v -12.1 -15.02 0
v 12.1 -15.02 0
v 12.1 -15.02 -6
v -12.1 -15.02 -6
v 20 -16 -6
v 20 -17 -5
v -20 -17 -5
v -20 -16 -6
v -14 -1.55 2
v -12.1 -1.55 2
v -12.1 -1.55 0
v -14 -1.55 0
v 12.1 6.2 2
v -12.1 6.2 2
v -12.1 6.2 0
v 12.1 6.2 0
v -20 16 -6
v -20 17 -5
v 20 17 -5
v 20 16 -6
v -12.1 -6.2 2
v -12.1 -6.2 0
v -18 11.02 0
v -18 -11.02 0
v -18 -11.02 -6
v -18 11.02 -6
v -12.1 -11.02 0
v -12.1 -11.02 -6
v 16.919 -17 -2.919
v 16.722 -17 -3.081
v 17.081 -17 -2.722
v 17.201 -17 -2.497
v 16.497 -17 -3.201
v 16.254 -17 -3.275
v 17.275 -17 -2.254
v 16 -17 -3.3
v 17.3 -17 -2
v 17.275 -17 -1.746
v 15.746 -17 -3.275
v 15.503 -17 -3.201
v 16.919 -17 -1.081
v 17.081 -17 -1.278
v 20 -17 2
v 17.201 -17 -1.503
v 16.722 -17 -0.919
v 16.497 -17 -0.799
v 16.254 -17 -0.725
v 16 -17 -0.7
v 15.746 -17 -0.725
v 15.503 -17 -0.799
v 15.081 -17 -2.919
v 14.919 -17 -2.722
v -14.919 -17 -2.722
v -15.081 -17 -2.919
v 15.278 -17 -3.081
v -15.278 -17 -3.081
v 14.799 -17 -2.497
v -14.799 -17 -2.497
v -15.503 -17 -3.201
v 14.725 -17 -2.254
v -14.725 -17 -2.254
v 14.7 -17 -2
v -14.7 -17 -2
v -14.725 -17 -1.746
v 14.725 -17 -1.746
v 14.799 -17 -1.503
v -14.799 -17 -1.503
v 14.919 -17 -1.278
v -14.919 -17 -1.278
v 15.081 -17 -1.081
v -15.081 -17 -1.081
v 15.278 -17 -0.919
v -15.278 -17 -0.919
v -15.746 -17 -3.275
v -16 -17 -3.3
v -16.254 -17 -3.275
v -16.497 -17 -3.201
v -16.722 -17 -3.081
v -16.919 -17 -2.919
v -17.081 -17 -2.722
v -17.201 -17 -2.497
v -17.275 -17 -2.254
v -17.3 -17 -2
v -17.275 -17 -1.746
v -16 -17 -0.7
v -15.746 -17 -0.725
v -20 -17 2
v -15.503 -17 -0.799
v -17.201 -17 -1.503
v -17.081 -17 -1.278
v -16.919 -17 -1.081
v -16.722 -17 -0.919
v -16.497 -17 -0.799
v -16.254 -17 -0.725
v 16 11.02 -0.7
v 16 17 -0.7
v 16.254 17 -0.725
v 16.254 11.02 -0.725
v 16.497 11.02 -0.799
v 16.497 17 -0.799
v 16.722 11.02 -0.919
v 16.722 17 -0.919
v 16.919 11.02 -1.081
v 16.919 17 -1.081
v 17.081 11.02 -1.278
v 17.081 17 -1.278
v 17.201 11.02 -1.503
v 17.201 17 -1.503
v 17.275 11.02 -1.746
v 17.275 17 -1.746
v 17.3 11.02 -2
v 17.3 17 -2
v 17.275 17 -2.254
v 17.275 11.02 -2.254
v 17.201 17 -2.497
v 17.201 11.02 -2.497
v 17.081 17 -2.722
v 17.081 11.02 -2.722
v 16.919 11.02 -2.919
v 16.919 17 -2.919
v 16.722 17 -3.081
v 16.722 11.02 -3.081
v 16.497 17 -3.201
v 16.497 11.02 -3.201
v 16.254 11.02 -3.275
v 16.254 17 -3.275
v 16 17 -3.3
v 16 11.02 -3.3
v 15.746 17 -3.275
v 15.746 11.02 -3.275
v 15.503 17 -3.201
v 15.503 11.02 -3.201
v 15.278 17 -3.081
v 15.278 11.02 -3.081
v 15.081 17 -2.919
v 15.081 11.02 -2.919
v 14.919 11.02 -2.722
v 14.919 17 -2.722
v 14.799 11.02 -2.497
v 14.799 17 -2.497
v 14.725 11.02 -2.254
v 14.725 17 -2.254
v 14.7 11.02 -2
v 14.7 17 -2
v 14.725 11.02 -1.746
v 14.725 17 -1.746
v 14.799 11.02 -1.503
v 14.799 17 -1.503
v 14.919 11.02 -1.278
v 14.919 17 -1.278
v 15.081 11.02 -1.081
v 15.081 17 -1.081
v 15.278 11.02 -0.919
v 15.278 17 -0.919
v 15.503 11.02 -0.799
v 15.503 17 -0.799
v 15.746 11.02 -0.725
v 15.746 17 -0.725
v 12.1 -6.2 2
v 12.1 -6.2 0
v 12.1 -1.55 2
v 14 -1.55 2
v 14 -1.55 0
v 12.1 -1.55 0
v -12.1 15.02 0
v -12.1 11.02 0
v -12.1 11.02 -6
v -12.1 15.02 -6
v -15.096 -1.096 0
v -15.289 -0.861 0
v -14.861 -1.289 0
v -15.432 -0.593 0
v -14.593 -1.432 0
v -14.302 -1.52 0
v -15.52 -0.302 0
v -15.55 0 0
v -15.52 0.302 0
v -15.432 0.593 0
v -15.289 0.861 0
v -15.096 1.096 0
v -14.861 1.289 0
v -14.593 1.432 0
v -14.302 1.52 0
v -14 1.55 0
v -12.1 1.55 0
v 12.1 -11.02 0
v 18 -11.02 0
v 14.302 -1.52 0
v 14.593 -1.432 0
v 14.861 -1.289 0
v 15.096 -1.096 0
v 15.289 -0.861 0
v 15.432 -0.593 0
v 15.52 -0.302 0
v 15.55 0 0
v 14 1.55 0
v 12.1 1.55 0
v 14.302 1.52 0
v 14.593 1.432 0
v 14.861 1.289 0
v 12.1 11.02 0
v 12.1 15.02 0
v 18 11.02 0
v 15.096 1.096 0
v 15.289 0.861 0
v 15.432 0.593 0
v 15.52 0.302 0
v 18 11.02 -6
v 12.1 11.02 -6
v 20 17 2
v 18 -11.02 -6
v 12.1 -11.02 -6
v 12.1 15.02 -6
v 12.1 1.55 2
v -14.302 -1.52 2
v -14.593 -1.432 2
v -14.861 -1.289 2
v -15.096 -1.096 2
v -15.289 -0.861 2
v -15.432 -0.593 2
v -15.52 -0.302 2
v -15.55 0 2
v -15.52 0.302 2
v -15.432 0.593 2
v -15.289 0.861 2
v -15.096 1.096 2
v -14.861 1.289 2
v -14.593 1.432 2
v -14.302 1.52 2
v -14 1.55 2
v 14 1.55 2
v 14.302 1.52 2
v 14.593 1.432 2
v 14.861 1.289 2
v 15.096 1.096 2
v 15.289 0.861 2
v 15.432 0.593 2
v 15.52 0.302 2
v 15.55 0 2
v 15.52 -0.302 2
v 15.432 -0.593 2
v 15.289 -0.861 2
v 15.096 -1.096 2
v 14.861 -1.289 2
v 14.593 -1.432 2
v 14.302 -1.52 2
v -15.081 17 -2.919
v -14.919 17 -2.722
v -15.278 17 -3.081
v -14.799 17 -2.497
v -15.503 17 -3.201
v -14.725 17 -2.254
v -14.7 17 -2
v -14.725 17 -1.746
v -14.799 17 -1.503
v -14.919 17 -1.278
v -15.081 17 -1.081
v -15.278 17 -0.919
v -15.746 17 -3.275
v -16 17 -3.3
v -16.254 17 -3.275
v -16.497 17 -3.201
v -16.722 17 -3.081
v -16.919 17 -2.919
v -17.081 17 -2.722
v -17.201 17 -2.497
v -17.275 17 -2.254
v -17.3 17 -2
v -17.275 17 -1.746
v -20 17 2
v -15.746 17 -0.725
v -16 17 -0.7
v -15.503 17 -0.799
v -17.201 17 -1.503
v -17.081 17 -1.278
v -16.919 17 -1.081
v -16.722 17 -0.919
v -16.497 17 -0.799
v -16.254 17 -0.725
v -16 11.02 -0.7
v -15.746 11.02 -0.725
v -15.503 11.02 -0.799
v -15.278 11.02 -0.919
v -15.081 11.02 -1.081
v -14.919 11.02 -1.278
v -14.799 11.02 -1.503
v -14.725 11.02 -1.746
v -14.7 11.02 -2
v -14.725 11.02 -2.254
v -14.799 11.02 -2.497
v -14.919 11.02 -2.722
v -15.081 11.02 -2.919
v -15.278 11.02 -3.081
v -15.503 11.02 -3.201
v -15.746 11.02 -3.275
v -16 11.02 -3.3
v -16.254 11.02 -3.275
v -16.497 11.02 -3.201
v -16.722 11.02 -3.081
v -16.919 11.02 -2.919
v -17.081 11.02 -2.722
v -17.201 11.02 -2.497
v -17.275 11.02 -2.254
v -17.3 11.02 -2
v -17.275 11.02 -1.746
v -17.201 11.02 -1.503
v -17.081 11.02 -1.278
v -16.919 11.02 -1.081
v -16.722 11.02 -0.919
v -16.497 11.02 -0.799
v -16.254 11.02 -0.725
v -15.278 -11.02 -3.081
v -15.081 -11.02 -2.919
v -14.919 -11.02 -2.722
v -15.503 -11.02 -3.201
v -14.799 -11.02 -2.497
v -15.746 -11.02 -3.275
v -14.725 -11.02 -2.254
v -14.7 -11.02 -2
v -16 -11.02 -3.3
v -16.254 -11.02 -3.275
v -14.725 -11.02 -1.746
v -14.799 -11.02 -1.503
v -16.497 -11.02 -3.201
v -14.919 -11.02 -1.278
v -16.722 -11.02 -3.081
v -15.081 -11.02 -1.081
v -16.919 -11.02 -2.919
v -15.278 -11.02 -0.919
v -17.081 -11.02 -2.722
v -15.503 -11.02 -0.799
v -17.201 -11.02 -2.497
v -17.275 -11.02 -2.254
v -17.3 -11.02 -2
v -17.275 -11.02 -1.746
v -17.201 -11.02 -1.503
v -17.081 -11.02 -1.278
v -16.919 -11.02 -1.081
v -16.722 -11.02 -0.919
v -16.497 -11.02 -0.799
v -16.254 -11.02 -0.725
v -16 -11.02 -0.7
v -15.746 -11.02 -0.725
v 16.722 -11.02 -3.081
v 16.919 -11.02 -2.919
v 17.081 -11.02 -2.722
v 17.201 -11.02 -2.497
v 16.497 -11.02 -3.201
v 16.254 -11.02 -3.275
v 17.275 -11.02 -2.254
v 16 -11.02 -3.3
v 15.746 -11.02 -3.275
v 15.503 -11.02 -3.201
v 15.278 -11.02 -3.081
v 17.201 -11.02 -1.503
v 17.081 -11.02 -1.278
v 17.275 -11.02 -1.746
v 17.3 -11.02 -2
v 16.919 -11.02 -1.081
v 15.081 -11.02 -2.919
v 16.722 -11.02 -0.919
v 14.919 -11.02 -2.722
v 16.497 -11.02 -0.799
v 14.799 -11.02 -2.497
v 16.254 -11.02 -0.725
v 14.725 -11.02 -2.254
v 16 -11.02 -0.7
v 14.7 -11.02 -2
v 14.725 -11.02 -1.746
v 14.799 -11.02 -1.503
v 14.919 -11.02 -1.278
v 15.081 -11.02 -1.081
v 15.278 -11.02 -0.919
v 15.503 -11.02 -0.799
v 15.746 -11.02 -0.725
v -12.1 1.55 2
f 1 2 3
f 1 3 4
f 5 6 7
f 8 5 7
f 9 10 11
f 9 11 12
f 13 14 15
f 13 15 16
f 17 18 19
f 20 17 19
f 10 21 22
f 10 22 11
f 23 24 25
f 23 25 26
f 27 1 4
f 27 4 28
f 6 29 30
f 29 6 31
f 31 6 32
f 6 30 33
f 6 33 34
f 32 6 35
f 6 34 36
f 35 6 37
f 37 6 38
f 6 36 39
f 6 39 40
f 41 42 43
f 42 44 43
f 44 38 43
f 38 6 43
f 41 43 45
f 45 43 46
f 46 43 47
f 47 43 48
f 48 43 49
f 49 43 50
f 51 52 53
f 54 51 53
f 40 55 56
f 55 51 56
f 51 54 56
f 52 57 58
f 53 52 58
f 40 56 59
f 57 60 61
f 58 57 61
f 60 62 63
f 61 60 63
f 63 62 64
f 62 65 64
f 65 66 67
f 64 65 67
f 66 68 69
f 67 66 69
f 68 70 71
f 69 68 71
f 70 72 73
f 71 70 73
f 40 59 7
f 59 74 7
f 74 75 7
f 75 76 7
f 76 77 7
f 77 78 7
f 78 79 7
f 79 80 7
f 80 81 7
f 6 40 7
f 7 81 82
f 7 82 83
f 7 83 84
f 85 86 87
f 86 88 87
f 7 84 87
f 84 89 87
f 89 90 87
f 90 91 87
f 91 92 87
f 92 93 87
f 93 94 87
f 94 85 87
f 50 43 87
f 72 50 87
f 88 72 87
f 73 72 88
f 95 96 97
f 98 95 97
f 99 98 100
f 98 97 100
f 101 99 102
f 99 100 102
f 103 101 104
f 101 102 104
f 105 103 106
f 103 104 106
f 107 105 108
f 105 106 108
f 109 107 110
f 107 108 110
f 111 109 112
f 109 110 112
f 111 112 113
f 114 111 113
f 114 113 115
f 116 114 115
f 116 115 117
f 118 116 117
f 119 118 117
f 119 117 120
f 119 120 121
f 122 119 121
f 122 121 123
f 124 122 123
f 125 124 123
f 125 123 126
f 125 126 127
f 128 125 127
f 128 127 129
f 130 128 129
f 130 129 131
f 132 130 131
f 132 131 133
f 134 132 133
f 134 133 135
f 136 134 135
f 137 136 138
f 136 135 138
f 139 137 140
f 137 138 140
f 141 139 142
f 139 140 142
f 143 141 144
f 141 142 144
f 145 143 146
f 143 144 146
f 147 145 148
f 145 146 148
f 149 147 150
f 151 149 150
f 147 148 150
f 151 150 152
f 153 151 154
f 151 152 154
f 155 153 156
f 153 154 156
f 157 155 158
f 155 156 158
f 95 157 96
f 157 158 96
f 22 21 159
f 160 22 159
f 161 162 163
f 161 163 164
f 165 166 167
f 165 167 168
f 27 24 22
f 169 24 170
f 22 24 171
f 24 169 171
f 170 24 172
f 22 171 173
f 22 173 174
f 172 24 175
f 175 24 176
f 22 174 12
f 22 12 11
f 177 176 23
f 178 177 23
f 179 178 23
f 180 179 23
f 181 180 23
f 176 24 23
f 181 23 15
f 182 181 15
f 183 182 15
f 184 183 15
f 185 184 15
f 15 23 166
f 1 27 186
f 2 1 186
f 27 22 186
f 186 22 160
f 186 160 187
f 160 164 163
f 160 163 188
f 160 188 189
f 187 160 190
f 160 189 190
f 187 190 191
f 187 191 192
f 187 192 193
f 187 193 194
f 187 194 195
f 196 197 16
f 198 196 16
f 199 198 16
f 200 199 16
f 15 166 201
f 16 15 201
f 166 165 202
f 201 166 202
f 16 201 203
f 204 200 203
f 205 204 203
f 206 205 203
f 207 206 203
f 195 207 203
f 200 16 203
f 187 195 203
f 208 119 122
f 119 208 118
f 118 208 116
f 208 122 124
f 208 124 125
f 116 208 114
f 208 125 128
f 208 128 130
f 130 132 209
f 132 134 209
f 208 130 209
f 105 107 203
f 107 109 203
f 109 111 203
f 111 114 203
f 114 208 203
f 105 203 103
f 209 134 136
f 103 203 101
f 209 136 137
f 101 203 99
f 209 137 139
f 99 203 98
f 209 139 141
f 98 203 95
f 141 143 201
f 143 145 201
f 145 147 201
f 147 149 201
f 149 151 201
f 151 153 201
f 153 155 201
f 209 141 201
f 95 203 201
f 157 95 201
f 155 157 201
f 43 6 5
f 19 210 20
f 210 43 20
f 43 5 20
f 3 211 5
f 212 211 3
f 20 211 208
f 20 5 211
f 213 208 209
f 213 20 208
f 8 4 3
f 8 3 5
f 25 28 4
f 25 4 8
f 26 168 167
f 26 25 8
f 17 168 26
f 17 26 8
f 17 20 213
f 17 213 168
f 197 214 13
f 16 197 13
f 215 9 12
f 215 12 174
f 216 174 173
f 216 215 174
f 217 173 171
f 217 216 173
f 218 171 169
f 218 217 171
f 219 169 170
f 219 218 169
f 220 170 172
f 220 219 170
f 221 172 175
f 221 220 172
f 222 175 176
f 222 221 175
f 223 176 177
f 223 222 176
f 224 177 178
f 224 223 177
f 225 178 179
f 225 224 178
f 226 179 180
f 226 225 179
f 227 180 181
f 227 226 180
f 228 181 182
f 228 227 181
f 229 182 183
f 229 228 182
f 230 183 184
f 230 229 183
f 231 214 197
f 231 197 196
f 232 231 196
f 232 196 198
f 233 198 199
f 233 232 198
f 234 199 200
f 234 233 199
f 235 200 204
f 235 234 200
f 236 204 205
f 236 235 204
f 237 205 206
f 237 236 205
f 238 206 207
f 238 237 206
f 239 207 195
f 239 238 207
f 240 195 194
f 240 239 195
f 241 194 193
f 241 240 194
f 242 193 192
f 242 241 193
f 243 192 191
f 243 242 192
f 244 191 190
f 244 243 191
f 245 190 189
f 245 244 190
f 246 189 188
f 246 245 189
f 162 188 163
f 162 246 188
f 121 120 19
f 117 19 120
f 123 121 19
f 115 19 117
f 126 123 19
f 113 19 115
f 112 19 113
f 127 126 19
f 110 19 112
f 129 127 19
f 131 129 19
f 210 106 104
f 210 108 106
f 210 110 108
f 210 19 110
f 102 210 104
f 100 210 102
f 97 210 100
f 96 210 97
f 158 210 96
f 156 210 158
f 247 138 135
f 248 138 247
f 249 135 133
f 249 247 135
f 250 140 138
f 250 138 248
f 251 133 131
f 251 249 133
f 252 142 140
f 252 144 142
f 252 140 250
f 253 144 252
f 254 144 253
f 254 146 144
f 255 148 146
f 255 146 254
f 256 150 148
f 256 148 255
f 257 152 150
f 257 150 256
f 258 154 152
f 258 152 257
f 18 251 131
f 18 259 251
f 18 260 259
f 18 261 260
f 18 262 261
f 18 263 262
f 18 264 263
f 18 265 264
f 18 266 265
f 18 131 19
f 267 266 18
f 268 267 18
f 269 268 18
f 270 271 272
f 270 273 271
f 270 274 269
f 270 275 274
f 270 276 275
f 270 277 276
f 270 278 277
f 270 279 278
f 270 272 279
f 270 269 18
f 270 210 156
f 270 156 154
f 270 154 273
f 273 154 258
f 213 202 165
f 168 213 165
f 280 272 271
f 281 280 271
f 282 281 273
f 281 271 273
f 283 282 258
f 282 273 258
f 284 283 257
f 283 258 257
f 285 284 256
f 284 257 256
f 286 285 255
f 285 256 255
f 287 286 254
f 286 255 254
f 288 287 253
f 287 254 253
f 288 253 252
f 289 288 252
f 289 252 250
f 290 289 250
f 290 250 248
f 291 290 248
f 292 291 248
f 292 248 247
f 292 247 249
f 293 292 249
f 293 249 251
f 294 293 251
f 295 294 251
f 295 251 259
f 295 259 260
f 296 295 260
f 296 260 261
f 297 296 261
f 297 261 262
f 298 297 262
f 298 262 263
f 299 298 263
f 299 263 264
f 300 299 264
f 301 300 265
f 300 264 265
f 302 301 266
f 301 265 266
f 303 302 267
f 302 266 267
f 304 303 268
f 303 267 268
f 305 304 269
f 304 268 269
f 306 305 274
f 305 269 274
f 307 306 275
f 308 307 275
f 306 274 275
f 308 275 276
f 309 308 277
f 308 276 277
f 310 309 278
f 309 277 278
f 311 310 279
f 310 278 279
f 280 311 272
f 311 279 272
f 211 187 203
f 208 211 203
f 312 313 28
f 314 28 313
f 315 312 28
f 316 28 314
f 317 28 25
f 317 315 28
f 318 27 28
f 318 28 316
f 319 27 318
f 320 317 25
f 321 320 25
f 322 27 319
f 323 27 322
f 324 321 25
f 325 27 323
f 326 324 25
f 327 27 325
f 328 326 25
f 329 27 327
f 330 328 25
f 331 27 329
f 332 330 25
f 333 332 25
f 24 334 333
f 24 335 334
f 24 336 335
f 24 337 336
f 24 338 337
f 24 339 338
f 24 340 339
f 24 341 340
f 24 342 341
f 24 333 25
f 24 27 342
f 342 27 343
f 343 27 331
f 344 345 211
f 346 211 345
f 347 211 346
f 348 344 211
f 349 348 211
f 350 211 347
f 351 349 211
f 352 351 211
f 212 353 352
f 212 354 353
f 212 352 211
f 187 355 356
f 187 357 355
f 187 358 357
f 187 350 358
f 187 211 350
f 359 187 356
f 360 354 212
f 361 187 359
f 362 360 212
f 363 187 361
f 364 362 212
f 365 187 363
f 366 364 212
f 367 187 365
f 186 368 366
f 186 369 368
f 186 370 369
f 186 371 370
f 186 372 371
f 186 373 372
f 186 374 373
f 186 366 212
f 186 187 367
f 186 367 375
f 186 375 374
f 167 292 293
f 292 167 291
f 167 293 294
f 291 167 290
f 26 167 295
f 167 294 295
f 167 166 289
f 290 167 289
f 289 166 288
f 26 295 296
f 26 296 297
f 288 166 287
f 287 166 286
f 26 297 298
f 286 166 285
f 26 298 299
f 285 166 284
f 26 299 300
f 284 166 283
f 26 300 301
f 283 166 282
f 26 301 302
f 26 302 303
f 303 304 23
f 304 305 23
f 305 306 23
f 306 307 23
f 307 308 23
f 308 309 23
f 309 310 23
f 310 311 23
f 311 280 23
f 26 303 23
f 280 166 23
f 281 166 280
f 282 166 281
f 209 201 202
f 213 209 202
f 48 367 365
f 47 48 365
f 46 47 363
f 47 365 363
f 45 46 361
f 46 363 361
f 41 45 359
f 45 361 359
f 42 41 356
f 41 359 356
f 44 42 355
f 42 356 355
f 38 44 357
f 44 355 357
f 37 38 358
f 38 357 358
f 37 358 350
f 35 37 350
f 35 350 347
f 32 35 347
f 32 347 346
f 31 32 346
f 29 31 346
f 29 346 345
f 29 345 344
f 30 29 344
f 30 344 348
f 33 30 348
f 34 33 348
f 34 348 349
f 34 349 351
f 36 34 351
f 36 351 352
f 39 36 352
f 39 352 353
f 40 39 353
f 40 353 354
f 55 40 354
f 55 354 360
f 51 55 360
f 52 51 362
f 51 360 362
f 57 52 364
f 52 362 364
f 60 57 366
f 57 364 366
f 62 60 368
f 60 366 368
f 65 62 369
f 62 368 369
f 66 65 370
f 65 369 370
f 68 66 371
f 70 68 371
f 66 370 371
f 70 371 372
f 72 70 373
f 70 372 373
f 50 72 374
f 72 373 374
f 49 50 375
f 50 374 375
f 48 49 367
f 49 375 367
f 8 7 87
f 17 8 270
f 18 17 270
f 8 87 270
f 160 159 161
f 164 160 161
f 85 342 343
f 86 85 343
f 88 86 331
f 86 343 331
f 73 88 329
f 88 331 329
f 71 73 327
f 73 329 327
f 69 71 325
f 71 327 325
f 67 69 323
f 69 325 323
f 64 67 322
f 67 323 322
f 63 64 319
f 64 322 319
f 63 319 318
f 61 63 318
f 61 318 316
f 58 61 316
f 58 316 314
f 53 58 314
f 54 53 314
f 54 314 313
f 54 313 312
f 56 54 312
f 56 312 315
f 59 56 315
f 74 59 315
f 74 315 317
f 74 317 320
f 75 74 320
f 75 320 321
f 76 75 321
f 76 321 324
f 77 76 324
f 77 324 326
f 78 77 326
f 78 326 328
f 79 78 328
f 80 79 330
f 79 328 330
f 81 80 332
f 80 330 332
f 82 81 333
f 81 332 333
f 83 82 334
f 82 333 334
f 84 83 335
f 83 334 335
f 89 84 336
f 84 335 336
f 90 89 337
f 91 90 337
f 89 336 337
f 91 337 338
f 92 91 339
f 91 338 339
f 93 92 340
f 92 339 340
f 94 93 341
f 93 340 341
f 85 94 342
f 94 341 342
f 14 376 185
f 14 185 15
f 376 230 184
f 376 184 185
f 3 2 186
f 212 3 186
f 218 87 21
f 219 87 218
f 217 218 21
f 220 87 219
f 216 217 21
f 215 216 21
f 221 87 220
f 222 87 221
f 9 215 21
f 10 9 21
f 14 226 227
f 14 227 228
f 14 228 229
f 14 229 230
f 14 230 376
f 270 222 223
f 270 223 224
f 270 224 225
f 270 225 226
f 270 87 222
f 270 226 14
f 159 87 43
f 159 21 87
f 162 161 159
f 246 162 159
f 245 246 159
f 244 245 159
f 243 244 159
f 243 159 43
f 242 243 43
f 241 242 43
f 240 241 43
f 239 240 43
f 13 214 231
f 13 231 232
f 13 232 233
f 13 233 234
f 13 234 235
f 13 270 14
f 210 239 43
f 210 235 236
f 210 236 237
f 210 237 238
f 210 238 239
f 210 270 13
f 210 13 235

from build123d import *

# Parameters (mm, degrees)
SKETCH_1_W          = 40
SKETCH_1_H          = 34
EXTRUDE_1_DEPTH     = 2
SKETCH_2_W          = 24.2
SKETCH_2_H          = 12.4
CUT_EXTRUDE_1_DEPTH = 2
SKETCH_3_W          = 2
SKETCH_3_H          = 34
EXTRUDE_2_DEPTH     = 6
SKETCH_5_W          = 36
SKETCH_5_H          = 1.98
EXTRUDE_3_DEPTH     = 6
SKETCH_6_W          = 5.9
SKETCH_6_H          = 4
EXTRUDE_4_DEPTH     = 6
SKETCH_7_R          = 1.3
CUT_EXTRUDE_2_DEPTH = 40.899874687
CHAMFER_1_SIZE      = 1


with BuildPart() as part:
    # ｽｹｯﾁ1 → ﾎﾞｽ - 押し出し1 (new body)
    with BuildSketch(Plane.XY):
        Rectangle(SKETCH_1_W, SKETCH_1_H)
    extrude(amount=EXTRUDE_1_DEPTH)

    # ｽｹｯﾁ2 → ｶｯﾄ - 押し出し1 (cut)
    with BuildSketch(Plane.XY.offset(2)):
        Rectangle(SKETCH_2_W, SKETCH_2_H)
        with BuildLine():
            Line((-14, 1.55), (14, 1.55))
            ThreePointArc((14, 1.55), (15.55, 0), (14, -1.55))
            Line((14, -1.55), (-14, -1.55))
            ThreePointArc((-14, -1.55), (-15.55, 0), (-14, 1.55))
        make_face()
    extrude(amount=-CUT_EXTRUDE_1_DEPTH, mode=Mode.SUBTRACT)

    # ｽｹｯﾁ3 → ﾎﾞｽ - 押し出し2 (add)
    with BuildSketch(Plane(origin=(0, 0, 0), x_dir=(-1, 0, 0), z_dir=(0, 0, -1))):
        with Locations((19, 0)):
            Rectangle(SKETCH_3_W, SKETCH_3_H)
        with Locations((-19, 0)):
            Rectangle(SKETCH_3_W, SKETCH_3_H)
    extrude(amount=EXTRUDE_2_DEPTH)

    # ｽｹｯﾁ5 → ﾎﾞｽ - 押し出し3 (add)
    with BuildSketch(Plane(origin=(0, 0, 0), x_dir=(-1, 0, 0), z_dir=(0, 0, -1))):
        with Locations((0, 16.01)):
            Rectangle(SKETCH_5_W, SKETCH_5_H)
        with Locations((0, -16.01)):
            Rectangle(SKETCH_5_W, SKETCH_5_H)
    extrude(amount=EXTRUDE_3_DEPTH)

    # ｽｹｯﾁ6 → ﾎﾞｽ - 押し出し4 (add)
    with BuildSketch(Plane(origin=(0, 0, 0), x_dir=(-1, 0, 0), z_dir=(0, 0, -1))):
        with Locations((-15.05, 13.02)):
            Rectangle(SKETCH_6_W, SKETCH_6_H)
        with Locations((15.05, 13.02)):
            Rectangle(SKETCH_6_W, SKETCH_6_H)
        with Locations((15.05, -13.02)):
            Rectangle(SKETCH_6_W, SKETCH_6_H)
        with Locations((-15.05, -13.02)):
            Rectangle(SKETCH_6_W, SKETCH_6_H)
    extrude(amount=EXTRUDE_4_DEPTH)

    # ｽｹｯﾁ7 → ｶｯﾄ - 押し出し2 (cut, through all)
    with BuildSketch(Plane(origin=(0, 17, 0), x_dir=(1, 0, 0), z_dir=(0, 1, 0))):
        with Locations(Location((-16, 2, 0), (0, 0, 270))):
            Circle(SKETCH_7_R)
        with Locations(Location((16, 2, 0), (0, 0, 270))):
            Circle(SKETCH_7_R)
    extrude(amount=-CUT_EXTRUDE_2_DEPTH, mode=Mode.SUBTRACT)

    # 面取り1
    chamfer_1_edges = [part.edges().sort_by_distance(p)[0] for p in [
        (0, 17, -6),
        (0, -17, -6),
    ]]
    chamfer(chamfer_1_edges, length=CHAMFER_1_SIZE)


solid = part.part
